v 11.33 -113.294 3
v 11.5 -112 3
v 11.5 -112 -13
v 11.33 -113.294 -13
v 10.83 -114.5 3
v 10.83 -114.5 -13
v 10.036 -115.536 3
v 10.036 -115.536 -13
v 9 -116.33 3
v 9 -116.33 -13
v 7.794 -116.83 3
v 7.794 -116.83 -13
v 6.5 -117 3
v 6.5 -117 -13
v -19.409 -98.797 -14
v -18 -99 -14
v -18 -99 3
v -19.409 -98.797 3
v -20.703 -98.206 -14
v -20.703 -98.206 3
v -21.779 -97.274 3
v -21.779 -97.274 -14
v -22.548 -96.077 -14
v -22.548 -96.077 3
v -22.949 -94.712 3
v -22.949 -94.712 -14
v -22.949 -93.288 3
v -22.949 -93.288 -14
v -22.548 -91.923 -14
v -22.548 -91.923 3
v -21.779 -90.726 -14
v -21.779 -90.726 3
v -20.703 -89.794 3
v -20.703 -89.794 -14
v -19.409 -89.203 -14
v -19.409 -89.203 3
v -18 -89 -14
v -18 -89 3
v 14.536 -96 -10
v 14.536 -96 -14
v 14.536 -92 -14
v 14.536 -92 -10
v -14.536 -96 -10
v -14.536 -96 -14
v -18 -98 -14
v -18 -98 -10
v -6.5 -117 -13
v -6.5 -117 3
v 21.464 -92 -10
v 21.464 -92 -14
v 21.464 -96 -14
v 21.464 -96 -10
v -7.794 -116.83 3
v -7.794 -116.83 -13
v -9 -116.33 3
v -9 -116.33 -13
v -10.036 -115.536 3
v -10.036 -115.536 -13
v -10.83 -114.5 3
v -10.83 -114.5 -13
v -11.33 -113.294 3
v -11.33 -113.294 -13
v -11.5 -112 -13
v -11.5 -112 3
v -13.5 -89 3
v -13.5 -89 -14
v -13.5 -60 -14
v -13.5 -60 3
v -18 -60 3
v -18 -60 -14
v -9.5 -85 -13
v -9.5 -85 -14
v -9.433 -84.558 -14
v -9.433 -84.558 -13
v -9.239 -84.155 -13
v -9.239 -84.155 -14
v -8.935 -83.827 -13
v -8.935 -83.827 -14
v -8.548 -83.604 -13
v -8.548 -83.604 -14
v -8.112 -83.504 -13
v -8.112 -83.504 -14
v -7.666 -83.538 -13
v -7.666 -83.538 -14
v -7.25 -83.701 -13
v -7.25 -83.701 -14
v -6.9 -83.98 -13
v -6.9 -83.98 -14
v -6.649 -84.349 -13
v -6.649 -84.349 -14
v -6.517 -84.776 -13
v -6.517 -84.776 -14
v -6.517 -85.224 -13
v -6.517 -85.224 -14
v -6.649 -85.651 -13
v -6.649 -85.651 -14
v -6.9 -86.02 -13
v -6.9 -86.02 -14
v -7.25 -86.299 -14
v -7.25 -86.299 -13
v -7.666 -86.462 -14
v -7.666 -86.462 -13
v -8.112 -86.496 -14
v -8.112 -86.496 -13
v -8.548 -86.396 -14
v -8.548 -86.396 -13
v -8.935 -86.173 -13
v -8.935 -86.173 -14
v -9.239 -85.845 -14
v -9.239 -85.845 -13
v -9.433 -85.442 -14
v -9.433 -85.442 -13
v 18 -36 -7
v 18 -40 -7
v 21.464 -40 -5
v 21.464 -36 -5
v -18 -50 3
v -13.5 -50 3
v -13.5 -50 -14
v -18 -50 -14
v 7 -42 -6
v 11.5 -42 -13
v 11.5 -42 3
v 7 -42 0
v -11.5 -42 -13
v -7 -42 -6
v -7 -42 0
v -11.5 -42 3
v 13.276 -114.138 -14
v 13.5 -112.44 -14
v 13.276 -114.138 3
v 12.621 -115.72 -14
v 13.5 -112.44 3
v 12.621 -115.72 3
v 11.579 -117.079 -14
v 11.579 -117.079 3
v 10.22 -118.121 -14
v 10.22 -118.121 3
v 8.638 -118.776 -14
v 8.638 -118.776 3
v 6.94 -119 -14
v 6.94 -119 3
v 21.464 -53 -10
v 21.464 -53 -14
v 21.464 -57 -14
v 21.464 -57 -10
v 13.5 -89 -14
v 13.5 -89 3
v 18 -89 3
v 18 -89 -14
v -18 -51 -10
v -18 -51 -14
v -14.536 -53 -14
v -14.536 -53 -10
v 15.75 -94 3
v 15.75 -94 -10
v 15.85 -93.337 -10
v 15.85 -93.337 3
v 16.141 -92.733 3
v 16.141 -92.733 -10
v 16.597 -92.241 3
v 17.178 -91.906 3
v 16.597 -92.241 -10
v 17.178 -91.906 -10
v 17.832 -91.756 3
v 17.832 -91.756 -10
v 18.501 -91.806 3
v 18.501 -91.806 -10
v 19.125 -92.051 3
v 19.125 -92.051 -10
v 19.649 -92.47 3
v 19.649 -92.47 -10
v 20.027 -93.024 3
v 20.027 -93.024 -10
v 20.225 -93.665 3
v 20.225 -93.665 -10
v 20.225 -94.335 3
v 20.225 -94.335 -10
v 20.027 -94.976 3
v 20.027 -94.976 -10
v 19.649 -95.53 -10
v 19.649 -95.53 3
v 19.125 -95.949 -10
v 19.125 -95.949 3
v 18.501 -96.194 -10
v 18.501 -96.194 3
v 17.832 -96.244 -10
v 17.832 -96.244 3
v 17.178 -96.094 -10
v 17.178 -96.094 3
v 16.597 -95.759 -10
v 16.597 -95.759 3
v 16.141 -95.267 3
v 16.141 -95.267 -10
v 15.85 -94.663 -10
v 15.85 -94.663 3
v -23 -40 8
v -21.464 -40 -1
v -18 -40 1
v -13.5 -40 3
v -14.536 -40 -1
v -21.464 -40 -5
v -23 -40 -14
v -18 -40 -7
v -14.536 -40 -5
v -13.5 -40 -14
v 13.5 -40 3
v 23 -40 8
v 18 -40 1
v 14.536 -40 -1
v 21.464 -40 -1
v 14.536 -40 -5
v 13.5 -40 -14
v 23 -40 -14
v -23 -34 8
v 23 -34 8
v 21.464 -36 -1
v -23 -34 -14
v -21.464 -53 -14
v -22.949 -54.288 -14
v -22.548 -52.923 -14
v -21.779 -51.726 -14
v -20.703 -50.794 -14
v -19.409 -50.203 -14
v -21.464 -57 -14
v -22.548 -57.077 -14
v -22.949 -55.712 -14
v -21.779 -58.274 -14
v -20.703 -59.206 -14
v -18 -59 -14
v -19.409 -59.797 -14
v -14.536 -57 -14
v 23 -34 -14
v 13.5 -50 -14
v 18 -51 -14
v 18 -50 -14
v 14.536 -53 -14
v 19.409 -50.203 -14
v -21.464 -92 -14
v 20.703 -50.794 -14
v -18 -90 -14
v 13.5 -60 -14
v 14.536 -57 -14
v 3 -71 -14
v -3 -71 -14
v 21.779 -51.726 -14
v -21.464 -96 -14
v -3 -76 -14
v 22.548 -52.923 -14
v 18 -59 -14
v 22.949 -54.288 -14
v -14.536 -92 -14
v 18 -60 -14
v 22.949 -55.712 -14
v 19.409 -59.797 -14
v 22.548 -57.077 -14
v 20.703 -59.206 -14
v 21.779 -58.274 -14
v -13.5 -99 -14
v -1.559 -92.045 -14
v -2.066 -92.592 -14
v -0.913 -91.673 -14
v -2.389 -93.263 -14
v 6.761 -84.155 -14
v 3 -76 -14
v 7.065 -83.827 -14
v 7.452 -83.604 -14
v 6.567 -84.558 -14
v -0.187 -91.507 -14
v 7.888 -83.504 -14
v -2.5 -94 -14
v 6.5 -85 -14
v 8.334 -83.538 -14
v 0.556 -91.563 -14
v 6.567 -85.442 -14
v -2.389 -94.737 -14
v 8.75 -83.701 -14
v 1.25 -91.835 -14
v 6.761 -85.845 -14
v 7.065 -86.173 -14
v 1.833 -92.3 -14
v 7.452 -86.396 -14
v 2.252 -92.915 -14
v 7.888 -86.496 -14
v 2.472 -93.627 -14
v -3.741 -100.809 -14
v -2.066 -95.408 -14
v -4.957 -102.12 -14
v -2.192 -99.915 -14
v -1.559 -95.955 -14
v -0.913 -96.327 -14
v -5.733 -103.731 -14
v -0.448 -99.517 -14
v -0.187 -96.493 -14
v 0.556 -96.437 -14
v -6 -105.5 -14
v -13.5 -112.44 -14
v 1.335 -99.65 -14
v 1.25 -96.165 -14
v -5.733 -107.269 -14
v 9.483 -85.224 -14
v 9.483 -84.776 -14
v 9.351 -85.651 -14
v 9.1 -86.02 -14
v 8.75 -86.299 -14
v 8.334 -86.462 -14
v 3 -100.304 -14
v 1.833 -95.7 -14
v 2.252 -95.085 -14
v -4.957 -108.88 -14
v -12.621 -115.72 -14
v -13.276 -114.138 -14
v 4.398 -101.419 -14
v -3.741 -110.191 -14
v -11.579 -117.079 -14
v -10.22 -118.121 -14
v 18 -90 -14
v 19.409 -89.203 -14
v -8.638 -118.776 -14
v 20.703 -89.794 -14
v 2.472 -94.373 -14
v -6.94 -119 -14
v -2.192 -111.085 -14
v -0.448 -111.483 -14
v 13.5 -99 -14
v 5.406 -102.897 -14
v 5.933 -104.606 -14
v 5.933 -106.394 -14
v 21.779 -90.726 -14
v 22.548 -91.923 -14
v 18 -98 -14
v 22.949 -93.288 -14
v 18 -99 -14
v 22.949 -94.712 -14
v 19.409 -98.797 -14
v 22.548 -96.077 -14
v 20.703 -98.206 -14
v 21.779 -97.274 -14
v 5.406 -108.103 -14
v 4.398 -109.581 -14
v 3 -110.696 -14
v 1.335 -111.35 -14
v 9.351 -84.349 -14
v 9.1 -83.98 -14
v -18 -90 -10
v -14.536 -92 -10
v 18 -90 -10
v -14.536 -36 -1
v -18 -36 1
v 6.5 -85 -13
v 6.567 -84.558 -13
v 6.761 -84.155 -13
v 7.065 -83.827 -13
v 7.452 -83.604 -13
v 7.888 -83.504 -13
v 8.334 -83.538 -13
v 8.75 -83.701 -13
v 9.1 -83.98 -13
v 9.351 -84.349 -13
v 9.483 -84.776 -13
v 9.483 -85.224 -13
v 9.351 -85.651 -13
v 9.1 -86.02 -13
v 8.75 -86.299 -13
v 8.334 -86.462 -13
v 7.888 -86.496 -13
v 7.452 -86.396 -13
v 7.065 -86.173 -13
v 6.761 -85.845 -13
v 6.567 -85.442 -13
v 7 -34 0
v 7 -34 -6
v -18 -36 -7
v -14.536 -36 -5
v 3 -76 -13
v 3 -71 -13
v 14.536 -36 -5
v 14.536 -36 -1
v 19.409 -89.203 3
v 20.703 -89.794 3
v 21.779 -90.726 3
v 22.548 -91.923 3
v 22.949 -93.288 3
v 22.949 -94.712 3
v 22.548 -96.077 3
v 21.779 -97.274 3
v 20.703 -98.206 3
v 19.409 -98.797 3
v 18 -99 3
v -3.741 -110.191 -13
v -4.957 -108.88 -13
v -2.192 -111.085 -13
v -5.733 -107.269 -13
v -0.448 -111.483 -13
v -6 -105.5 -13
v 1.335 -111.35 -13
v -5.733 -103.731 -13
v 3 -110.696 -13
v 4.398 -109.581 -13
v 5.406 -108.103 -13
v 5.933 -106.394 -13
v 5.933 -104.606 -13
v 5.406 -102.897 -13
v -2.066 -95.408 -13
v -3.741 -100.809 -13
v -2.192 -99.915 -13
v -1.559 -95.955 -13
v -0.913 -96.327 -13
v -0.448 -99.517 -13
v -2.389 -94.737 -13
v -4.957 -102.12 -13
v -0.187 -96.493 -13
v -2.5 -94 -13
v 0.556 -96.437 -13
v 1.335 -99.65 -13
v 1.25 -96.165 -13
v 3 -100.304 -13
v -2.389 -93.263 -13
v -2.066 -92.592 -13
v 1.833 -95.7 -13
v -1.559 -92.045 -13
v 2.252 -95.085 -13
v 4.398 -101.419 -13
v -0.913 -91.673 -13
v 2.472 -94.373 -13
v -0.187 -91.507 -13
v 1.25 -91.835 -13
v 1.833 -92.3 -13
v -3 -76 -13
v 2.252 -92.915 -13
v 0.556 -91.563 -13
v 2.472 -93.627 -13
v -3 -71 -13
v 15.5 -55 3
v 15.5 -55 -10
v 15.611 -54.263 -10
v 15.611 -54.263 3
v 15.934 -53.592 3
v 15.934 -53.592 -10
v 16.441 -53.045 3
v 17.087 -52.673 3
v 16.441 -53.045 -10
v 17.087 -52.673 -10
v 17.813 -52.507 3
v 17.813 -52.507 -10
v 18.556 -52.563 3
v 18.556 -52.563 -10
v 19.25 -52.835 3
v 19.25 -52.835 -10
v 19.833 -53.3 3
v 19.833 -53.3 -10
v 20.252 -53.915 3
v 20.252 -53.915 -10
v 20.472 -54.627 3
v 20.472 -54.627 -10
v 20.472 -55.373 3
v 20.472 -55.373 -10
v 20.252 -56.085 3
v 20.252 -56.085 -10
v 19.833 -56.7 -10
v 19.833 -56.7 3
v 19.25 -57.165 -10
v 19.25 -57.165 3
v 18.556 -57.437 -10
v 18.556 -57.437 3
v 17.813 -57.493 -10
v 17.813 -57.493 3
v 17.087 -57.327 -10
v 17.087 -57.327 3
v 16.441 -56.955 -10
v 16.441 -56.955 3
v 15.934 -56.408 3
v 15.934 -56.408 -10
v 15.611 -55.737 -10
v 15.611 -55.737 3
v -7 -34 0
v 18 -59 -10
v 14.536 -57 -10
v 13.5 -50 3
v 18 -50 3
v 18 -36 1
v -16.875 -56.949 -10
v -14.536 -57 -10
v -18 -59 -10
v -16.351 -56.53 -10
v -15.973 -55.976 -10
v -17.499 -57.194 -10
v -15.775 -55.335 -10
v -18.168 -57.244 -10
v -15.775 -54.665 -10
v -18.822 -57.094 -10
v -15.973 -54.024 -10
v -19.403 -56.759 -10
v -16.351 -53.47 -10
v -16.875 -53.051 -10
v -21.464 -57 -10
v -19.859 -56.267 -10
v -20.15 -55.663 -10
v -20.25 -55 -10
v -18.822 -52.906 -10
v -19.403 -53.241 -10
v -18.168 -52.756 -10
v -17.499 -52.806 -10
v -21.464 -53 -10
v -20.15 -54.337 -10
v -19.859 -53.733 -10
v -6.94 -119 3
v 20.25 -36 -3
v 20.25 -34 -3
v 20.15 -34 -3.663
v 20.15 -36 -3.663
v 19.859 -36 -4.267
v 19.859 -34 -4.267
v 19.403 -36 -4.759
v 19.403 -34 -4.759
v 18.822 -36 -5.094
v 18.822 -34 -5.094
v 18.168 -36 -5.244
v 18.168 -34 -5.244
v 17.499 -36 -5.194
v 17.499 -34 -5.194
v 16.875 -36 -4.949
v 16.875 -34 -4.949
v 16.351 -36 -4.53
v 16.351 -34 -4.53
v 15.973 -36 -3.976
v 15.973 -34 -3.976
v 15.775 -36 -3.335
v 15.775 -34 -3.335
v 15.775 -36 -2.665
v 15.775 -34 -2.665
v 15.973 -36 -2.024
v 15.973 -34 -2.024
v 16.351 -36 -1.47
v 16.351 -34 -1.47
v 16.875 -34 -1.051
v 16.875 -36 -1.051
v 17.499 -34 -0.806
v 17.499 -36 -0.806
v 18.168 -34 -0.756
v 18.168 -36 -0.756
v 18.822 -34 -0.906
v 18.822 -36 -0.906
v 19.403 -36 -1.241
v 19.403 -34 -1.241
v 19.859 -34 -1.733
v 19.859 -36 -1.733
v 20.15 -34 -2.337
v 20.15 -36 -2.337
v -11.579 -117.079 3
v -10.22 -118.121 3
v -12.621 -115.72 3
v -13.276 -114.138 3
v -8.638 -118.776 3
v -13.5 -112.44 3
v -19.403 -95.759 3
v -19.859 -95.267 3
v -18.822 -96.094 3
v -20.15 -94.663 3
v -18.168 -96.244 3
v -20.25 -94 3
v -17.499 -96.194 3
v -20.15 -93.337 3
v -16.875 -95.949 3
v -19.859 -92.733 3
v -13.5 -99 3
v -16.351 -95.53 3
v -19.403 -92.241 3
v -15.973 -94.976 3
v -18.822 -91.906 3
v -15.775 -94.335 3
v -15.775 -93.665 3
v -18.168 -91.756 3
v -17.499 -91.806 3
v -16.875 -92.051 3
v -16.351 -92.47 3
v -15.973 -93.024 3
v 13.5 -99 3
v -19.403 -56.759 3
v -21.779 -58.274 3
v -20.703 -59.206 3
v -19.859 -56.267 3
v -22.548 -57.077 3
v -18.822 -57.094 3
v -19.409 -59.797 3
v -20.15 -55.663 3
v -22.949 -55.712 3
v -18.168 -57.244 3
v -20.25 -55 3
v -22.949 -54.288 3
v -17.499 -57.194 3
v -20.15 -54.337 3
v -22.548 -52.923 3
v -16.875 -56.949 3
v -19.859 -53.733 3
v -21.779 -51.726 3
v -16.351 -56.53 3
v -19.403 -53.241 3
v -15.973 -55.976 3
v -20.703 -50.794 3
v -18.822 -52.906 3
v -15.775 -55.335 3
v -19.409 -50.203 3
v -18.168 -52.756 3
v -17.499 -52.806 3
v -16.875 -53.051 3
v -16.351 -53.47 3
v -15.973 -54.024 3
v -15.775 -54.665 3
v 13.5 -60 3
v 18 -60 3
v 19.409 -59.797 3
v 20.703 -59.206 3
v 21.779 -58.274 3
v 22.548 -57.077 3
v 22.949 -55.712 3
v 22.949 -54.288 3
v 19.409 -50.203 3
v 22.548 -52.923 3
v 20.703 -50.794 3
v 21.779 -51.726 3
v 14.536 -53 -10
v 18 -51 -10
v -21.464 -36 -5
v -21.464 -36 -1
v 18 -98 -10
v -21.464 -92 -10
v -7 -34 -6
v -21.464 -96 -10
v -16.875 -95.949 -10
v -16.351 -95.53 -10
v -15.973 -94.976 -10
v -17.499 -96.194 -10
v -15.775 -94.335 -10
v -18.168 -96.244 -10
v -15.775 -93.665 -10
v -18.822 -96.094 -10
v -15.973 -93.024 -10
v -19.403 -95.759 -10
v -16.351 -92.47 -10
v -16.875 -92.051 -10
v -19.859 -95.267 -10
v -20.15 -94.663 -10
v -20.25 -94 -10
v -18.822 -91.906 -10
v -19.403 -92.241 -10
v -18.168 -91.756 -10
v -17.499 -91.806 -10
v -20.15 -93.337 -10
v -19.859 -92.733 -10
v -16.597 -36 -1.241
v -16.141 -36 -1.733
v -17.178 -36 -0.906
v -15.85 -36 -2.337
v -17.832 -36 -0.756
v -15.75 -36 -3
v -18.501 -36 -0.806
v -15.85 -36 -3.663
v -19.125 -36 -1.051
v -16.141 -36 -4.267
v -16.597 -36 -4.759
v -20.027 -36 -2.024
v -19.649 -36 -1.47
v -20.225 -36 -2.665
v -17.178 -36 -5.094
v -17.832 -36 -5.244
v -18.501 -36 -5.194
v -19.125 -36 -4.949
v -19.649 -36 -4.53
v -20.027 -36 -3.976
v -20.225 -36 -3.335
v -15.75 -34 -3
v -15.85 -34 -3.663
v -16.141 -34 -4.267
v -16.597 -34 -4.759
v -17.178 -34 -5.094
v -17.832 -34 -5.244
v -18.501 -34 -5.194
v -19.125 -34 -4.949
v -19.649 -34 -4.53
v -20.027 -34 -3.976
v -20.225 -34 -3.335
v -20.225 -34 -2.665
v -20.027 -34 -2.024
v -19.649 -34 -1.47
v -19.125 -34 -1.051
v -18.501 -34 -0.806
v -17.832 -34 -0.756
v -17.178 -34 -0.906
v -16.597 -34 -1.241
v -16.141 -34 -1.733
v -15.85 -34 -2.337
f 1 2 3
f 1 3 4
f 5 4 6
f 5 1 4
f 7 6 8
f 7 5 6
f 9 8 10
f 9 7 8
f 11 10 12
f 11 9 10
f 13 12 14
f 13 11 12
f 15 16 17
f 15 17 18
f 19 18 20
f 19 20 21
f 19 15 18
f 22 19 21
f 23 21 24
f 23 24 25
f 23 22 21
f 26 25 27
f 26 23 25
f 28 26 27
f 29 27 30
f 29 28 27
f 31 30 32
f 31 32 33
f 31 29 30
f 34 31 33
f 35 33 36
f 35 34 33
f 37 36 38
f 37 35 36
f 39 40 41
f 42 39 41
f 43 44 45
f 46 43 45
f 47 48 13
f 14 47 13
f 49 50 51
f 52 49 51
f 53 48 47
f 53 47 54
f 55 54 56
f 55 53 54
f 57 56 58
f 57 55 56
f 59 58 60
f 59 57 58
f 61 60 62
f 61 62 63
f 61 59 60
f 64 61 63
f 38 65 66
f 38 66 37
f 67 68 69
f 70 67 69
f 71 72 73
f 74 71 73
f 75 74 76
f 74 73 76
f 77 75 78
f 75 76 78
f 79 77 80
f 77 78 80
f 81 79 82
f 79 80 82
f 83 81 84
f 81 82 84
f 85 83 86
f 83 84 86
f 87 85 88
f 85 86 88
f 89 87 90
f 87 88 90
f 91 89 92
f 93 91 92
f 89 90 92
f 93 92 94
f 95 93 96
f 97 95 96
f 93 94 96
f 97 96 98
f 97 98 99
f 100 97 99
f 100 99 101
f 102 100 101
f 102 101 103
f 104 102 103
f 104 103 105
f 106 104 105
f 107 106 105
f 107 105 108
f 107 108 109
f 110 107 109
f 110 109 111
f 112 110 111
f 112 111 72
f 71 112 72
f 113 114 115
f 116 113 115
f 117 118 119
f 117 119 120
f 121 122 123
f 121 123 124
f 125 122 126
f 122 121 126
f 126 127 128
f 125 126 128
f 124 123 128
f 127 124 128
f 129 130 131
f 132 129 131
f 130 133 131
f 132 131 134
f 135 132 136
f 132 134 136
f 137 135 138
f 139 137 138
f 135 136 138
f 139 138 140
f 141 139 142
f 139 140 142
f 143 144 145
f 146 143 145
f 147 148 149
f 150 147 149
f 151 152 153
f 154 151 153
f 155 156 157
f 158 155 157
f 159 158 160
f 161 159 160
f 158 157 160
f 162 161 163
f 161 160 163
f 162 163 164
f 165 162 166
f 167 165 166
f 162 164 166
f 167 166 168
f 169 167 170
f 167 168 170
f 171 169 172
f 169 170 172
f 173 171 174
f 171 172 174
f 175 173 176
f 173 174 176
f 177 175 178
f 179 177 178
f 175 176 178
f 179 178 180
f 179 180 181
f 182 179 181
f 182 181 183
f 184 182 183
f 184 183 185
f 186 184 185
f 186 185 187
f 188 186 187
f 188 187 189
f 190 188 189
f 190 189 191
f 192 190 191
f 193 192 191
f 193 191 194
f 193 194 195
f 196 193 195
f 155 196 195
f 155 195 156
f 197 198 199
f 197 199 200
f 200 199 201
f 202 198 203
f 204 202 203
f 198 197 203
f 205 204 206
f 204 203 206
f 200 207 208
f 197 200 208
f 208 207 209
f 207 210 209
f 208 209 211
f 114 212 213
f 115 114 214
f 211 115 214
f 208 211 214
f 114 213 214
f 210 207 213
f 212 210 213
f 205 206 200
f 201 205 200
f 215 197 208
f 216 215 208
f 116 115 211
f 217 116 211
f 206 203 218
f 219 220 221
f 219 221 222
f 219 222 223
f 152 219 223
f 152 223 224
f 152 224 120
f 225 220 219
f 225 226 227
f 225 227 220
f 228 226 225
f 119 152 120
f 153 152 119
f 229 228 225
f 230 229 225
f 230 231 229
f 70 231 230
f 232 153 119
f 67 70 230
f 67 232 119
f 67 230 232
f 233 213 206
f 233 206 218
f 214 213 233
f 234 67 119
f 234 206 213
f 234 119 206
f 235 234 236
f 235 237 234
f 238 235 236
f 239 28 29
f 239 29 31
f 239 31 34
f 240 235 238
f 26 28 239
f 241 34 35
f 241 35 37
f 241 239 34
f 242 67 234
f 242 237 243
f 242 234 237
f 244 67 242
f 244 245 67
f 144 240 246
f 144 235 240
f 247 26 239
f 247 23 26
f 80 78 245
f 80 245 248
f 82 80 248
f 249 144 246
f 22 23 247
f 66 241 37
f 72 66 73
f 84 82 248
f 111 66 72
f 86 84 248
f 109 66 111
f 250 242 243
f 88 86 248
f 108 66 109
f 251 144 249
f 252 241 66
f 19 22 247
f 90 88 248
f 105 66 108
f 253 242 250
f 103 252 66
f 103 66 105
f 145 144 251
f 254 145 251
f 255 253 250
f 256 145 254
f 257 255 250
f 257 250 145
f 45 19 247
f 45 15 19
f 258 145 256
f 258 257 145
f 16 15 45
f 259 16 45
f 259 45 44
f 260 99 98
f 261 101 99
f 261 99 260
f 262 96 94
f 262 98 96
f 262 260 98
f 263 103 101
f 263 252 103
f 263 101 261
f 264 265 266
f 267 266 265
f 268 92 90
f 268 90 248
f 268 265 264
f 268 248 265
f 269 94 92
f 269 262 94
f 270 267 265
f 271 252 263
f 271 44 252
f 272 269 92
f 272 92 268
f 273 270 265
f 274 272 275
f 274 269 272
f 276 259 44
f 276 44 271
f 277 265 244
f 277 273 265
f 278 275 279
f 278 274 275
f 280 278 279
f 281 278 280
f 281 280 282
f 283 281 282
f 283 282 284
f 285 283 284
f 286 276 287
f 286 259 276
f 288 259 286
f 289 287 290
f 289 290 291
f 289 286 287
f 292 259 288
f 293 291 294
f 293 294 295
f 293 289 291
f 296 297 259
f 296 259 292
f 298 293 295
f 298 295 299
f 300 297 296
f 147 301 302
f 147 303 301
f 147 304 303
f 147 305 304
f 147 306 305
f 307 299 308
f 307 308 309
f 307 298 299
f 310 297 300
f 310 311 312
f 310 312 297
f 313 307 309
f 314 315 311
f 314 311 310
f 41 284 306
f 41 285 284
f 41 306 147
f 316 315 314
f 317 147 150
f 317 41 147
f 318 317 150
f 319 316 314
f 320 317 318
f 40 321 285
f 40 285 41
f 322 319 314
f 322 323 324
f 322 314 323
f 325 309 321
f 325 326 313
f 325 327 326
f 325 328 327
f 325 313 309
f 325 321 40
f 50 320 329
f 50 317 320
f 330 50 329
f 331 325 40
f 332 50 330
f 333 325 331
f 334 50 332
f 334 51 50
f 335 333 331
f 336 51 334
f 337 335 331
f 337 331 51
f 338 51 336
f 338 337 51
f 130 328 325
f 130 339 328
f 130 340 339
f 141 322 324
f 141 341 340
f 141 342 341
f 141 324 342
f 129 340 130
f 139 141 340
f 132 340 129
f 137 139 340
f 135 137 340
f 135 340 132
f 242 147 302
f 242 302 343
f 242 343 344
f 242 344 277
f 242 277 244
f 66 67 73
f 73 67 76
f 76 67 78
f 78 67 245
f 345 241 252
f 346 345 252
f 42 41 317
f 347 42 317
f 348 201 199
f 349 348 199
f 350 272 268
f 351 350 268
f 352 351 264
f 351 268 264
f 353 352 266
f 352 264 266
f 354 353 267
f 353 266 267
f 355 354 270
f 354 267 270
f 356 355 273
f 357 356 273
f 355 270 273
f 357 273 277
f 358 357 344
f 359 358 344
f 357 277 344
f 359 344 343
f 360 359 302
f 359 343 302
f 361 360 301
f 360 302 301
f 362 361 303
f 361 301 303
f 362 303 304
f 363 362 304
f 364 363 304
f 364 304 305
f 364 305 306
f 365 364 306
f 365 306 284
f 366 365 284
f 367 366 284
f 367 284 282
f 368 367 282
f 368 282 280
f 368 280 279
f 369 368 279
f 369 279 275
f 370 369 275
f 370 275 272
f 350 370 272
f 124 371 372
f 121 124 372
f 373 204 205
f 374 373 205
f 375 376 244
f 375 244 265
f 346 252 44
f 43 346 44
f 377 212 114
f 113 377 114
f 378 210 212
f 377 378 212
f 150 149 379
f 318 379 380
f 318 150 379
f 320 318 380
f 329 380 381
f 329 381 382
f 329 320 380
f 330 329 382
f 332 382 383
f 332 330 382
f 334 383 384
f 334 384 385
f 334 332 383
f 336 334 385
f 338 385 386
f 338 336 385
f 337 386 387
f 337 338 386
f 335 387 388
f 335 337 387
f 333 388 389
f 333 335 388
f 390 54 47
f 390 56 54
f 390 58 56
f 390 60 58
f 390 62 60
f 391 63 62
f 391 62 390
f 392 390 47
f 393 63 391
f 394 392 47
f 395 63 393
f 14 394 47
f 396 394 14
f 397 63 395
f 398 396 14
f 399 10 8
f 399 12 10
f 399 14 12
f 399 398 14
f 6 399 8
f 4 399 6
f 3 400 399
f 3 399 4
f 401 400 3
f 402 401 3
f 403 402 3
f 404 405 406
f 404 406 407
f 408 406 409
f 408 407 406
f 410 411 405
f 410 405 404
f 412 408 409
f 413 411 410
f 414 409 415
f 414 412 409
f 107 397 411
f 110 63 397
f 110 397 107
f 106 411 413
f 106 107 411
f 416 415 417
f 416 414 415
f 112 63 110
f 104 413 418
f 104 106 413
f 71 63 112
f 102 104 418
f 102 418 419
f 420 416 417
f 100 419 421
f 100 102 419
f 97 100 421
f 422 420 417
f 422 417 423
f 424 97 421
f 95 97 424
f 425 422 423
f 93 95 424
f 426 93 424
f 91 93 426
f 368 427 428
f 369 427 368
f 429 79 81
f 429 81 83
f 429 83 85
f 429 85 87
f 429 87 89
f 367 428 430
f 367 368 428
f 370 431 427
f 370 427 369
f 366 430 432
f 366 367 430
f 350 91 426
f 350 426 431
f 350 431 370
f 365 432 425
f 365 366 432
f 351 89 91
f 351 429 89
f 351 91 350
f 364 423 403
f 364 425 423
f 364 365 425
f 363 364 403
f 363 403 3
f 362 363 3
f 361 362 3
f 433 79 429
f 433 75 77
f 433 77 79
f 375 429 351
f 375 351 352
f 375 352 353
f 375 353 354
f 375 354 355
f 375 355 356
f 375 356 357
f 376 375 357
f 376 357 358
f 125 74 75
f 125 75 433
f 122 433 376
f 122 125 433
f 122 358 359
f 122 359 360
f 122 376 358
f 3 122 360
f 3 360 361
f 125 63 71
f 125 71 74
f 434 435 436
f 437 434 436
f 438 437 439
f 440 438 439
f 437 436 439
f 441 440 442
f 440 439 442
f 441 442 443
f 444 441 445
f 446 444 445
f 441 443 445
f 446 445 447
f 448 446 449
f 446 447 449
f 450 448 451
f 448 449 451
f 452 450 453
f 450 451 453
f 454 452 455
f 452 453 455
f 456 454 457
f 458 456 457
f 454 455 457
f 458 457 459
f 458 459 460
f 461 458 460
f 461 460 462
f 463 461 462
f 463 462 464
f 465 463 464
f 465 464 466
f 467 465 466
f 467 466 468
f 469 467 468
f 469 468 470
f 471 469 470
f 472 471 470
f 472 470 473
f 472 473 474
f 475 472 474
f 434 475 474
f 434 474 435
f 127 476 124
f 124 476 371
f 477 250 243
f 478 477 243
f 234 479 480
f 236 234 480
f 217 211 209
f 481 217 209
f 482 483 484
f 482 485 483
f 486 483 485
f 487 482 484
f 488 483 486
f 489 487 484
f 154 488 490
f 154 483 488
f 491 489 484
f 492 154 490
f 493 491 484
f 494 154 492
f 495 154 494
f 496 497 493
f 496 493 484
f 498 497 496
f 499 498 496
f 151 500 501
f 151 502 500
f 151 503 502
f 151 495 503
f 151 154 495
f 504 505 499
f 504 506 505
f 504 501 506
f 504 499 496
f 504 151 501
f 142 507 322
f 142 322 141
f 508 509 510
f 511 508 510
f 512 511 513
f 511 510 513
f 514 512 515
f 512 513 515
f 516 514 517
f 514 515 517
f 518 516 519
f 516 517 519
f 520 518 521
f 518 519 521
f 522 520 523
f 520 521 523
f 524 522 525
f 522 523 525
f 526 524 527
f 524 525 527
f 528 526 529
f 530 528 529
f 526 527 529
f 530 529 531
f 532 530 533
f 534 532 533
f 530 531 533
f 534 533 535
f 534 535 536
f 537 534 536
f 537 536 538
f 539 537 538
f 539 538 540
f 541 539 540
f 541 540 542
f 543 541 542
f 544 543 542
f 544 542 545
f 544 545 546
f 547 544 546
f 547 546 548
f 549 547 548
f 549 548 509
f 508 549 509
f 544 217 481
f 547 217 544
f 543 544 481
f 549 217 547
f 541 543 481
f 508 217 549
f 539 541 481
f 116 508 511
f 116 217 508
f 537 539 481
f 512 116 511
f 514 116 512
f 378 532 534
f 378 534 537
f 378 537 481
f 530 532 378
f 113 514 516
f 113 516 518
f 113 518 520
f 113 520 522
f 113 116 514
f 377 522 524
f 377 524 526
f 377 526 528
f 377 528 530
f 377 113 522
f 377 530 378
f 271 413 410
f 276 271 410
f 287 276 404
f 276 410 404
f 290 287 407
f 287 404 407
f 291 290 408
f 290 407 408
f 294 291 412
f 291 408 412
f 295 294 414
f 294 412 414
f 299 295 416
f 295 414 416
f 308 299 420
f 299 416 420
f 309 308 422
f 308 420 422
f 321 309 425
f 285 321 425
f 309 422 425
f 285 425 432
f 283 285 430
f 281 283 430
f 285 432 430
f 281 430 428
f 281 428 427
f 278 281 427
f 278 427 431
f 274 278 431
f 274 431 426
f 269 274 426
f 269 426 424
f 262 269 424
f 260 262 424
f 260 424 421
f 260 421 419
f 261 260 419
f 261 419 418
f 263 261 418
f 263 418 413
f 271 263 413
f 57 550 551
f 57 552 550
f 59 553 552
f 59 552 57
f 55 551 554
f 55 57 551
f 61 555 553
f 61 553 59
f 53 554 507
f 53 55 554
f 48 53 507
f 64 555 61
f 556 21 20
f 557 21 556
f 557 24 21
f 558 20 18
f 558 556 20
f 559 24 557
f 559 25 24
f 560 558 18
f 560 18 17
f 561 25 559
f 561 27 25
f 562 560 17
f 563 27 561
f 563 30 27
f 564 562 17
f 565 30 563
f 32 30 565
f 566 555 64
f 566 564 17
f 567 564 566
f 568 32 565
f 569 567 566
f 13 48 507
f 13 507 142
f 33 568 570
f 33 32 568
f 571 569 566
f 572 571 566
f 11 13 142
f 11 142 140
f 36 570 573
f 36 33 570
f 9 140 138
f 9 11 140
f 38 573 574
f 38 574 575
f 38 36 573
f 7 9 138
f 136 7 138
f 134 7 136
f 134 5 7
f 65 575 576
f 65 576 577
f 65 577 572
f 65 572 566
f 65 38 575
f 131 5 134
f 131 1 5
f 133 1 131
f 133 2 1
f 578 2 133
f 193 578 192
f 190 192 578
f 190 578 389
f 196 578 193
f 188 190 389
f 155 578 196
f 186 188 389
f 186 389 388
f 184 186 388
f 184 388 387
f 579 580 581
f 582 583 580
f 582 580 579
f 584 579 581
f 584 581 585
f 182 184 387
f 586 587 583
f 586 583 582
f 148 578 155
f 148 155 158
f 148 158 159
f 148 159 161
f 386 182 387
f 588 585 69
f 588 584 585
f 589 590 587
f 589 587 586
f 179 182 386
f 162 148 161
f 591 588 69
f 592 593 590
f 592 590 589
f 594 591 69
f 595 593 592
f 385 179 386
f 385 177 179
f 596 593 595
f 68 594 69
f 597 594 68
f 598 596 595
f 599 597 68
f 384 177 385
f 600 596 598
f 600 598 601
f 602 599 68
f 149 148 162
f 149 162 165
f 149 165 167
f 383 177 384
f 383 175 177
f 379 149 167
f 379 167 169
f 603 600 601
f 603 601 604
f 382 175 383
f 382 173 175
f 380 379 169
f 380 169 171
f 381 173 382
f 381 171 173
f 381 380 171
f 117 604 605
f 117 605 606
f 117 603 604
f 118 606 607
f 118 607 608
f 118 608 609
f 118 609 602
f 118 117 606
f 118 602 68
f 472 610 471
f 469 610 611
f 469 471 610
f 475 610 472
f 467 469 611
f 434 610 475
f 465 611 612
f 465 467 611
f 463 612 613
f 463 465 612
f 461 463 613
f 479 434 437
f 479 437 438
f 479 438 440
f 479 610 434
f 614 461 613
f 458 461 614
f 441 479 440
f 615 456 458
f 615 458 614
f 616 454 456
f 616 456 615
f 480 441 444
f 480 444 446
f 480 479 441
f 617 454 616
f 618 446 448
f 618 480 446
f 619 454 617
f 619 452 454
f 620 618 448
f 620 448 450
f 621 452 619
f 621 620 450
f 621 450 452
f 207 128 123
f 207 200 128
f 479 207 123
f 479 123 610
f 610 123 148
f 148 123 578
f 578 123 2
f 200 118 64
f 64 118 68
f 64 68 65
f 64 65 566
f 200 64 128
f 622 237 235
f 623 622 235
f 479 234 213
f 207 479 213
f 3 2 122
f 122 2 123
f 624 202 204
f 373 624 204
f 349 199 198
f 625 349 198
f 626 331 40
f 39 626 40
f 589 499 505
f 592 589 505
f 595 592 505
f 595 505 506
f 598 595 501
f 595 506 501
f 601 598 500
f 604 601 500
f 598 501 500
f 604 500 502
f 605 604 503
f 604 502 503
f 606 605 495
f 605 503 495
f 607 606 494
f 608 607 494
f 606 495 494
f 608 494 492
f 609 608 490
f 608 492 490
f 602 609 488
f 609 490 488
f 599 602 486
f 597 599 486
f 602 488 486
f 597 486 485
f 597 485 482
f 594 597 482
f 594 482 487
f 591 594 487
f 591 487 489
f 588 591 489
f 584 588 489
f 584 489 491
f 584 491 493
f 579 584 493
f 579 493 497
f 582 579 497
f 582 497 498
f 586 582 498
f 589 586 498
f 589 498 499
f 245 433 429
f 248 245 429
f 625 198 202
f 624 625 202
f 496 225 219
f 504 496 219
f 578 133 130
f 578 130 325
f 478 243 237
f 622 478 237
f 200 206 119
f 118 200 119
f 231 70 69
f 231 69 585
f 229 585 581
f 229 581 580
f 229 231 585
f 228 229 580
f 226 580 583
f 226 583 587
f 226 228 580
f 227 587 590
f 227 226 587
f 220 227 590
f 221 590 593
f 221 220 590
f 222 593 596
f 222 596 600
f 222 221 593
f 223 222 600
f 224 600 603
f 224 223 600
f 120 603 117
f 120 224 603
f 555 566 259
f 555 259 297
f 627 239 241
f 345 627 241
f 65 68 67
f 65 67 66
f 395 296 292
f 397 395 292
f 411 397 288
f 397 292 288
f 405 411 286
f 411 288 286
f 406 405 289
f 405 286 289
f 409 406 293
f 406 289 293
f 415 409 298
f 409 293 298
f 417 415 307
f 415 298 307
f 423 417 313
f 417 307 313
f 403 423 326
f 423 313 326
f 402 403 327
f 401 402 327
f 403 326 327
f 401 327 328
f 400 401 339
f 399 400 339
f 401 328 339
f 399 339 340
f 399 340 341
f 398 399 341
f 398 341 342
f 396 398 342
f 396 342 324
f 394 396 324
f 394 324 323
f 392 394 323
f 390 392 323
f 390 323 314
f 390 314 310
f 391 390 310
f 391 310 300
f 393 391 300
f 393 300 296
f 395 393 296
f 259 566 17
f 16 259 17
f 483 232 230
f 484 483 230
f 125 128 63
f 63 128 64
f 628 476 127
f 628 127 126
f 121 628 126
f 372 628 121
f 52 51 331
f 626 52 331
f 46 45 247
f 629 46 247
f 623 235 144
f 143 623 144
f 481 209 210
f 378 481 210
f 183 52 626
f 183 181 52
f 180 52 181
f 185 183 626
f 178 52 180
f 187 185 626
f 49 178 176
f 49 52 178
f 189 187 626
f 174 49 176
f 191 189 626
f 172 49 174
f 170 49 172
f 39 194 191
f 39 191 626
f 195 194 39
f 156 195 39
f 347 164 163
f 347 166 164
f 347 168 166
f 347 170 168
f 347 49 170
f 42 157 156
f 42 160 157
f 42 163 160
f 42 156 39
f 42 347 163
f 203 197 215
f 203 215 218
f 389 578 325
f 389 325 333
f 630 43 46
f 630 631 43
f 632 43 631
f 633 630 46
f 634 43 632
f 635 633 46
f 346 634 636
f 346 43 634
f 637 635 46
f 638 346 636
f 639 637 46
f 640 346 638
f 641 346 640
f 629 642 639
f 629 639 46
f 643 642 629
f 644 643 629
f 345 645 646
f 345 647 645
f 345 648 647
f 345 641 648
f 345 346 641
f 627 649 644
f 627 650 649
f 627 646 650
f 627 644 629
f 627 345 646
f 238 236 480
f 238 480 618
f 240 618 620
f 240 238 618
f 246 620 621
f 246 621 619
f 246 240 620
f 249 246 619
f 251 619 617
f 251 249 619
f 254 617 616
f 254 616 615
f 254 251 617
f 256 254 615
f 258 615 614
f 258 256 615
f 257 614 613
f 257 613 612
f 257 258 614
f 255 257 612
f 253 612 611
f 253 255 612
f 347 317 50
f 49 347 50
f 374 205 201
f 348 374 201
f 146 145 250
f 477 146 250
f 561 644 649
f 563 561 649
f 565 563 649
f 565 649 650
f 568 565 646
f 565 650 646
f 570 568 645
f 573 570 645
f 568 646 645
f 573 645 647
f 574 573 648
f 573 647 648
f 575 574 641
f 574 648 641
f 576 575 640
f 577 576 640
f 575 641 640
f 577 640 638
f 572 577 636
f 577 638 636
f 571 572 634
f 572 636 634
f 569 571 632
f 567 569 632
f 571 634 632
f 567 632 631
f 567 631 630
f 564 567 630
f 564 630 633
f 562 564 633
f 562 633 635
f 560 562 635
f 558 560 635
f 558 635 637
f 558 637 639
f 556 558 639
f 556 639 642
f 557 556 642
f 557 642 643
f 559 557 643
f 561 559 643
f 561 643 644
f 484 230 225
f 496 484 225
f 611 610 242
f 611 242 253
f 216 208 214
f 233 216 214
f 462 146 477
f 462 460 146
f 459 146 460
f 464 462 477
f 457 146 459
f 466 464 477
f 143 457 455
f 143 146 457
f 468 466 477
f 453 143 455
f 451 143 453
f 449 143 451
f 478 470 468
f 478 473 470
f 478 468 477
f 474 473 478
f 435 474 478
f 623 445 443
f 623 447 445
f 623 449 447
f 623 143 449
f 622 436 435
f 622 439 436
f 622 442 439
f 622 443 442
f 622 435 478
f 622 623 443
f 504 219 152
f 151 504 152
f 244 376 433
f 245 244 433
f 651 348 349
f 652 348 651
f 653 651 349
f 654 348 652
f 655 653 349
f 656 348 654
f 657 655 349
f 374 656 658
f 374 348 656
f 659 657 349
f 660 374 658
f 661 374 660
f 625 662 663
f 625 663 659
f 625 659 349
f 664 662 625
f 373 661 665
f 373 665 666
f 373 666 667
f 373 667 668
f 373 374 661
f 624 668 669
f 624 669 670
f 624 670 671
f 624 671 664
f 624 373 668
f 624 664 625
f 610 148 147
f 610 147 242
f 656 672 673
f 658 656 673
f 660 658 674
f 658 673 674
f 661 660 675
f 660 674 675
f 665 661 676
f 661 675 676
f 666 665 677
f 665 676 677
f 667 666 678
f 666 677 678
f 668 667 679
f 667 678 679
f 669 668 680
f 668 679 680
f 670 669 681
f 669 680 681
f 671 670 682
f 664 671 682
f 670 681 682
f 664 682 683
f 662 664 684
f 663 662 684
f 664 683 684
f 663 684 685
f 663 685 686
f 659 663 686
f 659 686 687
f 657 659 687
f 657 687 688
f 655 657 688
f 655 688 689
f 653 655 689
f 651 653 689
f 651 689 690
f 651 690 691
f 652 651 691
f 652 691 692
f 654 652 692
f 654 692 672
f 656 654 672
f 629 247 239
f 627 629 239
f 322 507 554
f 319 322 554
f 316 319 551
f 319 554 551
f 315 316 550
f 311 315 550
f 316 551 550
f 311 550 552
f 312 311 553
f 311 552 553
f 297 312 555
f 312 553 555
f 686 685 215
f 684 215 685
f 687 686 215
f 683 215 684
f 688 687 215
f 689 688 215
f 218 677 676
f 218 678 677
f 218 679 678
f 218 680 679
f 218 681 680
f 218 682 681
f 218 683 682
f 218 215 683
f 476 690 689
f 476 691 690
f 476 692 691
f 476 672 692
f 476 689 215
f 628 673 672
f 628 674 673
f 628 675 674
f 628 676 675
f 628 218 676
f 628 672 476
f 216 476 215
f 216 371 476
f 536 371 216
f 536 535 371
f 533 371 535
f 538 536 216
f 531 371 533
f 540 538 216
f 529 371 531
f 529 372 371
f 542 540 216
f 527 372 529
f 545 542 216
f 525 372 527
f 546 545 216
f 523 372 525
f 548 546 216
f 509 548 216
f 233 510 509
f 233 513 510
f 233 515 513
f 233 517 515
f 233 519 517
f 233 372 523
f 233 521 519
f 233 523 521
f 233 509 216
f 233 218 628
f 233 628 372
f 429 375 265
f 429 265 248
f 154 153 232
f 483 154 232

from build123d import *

# Parameters (mm, degrees)
PAD018_DEPTH            = 16
PAD019_DEPTH            = 1
SKETCH049_R             = 6
SKETCH049_R_2           = 1.5
POCKET012_DEPTH         = 5
SKETCH050_R             = 2.5
SKETCH050_W             = 6
SKETCH050_H             = 5
POCKET013_DEPTH         = 2
SKETCH051_R             = 2.25
SKETCH051_R_2           = 2.5
PAD020_DEPTH            = 17
SKETCH053_W             = 46
SKETCH053_H             = 22
PAD021_DEPTH            = 6
SKETCH054_R             = 2.25
POCKET015_DEPTH         = 8
POCKET016_DEPTH         = 4
SKETCH065_W             = 14
SKETCH065_H             = 6
POCKET023_DEPTH         = 8
POCKET080_DEPTH         = 4
BODY007_PLACEMENT_ANGLE = 180


with BuildPart() as part:
    # Sketch046 → Pad018 (new body)
    with BuildSketch(Plane.XY):
        with BuildLine():
            Line((-13.5, 0), (-13.5, -72.44))
            ThreePointArc((-13.5, -72.44), (-11.57862, -77.07862), (-6.94, -79))
            Line((-6.94, -79), (6.94, -79))
            ThreePointArc((6.94, -79), (11.57862, -77.07862), (13.5, -72.44))
            Line((13.5, -72.44), (13.5, 0))
            Line((13.5, 0), (-13.5, 0))
        make_face()
        with BuildLine():
            Line((11.5, -2), (11.5, -72))
            ThreePointArc((6.5, -77), (10.035534, -75.535534), (11.5, -72))
            Line((6.5, -77), (-6.5, -77))
            ThreePointArc((-11.5, -72), (-10.035534, -75.535534), (-6.5, -77))
            Line((-11.5, -72), (-11.5, -2))
            Line((-11.5, -2), (11.5, -2))
        make_face(mode=Mode.SUBTRACT)
    extrude(amount=PAD018_DEPTH)

    # Sketch047 (on Face14 of Pad018) → Pad019 (join)
    with BuildSketch(Plane.XY.offset(16)):
        with BuildLine():
            Line((-13.5, 0), (13.5, 0))
            Line((13.5, 0), (13.5, -72.44))
            ThreePointArc((6.94, -79), (11.57862, -77.07862), (13.5, -72.44))
            Line((6.94, -79), (-6.94, -79))
            ThreePointArc((-13.5, -72.44), (-11.57862, -77.07862), (-6.94, -79))
            Line((-13.5, -72.44), (-13.5, 0))
        make_face()
    extrude(amount=PAD019_DEPTH)

    # Sketch049 → Pocket012 (cut)
    with BuildSketch(Plane.XY.offset(17)):
        with Locations((0, -65.5)):
            Circle(SKETCH049_R)
        with Locations((8, -45)):
            Circle(SKETCH049_R_2)
        with Locations((-8, -45)):
            Circle(SKETCH049_R_2)
    extrude(amount=-POCKET012_DEPTH, mode=Mode.SUBTRACT)

    # Sketch050 (on Face21 of Pocket012) → Pocket013 (cut)
    with BuildSketch(Plane(origin=(0, 0, 16), x_dir=(1, 0, 0), z_dir=(0, 0, -1))):
        with Locations((0, 54)):
            Circle(SKETCH050_R)
        with Locations((0, 33.5)):
            Rectangle(SKETCH050_W, SKETCH050_H)
    extrude(amount=-POCKET013_DEPTH, mode=Mode.SUBTRACT)

    # Sketch051 (on Face17 of Pocket013) → Pad020 (join)
    with BuildSketch(Plane.XY.offset(17)):
        with BuildLine():
            Line((-13, -49), (-13, -59))
            Line((-13, -59), (-18, -59))
            ThreePointArc((-18, -49), (-23.000001, -54), (-18, -59))
            Line((-13, -49), (-18, -49))
        make_face()
        with Locations((-18.000001, -54)):
            Circle(SKETCH051_R, mode=Mode.SUBTRACT)
        with BuildLine():
            Line((13, -49), (13, -59))
            Line((13, -59), (18, -59))
            ThreePointArc((18, -59), (23, -54), (18, -49))
            Line((13, -49), (18, -49))
        make_face()
        with Locations((18, -54)):
            Circle(SKETCH051_R, mode=Mode.SUBTRACT)
        with BuildLine():
            Line((13, -10), (13, -20))
            Line((13, -20), (18, -20))
            ThreePointArc((18, -20), (23, -15), (18, -10))
            Line((13, -10), (18, -10))
        make_face()
        with Locations((18, -15)):
            Circle(SKETCH051_R, mode=Mode.SUBTRACT)
        with BuildLine():
            Line((-13, -10), (-13, -20))
            Line((-13, -20), (-18, -20))
            ThreePointArc((-18, -10), (-22.999995, -15), (-18, -20))
            Line((-13, -10), (-18, -10))
        make_face()
        with Locations((-17.999995, -15)):
            Circle(SKETCH051_R_2, mode=Mode.SUBTRACT)
    extrude(amount=-PAD020_DEPTH)

    # Sketch053 (on Face5 of Pad020) → Pad021 (join)
    with BuildSketch(Plane(origin=(0, 0, 0), x_dir=(-1, 0, 0), z_dir=(0, 1, 0))):
        with Locations((0, 6)):
            Rectangle(SKETCH053_W, SKETCH053_H)
    extrude(amount=PAD021_DEPTH)

    # Sketch054 (on Face64 of Pad021) → Pocket015 (cut)
    with BuildSketch(Plane(origin=(0, 6, 0), x_dir=(-1, 0, 0), z_dir=(0, 1, 0))):
        with Locations((-18, 6)):
            Circle(SKETCH054_R)
        with Locations((18, 6)):
            Circle(SKETCH054_R)
    extrude(amount=-POCKET015_DEPTH, mode=Mode.SUBTRACT)

    # Sketch055 (on Face5 of Pocket015) → Pocket016 (cut)
    with BuildSketch(Plane.XZ):
        Polygon((-14.535898, 4), (-14.535898, 8), (-18, 10), (-21.464102, 8), (-21.464102, 4), (-18, 2), align=None)
        Polygon((21.464102, 4), (21.464102, 8), (18, 10), (14.535898, 8), (14.535898, 4), (18, 2), align=None)
    extrude(amount=-POCKET016_DEPTH, mode=Mode.SUBTRACT)

    # Sketch065 (on Face76 of Pocket016) → Pocket023 (cut)
    with BuildSketch(Plane(origin=(0, 6, 0), x_dir=(-1, 0, 0), z_dir=(0, 1, 0))):
        with Locations((0, 6)):
            Rectangle(SKETCH065_W, SKETCH065_H)
    extrude(amount=-POCKET023_DEPTH, mode=Mode.SUBTRACT)

    # Sketch056 (on Face86 of Pocket023) → Pocket080 (cut)
    with BuildSketch(Plane.XY.offset(17)):
        Polygon((-14.535898, -56), (-14.535898, -52), (-18, -50), (-21.464102, -52), (-21.464102, -56), (-18, -58), align=None)
        Polygon((21.464102, -56), (21.464102, -52), (18, -50), (14.535898, -52), (14.535898, -56), (18, -58), align=None)
        Polygon((21.464102, -17), (21.464102, -13), (18, -11), (14.535898, -13), (14.535898, -17), (18, -19), align=None)
        Polygon((-14.535898, -17), (-14.535898, -13), (-18, -11), (-21.464102, -13), (-21.464102, -17), (-18, -19), align=None)
    extrude(amount=-POCKET080_DEPTH, mode=Mode.SUBTRACT)


with BuildPart() as part_1:
    # Body007 placement: moved
    add(part.part.moved(Location((0, -40, 3))).rotate(Axis((0, -40, 3), (0, 1, 0)), BODY007_PLACEMENT_ANGLE))


solid = part_1.part
